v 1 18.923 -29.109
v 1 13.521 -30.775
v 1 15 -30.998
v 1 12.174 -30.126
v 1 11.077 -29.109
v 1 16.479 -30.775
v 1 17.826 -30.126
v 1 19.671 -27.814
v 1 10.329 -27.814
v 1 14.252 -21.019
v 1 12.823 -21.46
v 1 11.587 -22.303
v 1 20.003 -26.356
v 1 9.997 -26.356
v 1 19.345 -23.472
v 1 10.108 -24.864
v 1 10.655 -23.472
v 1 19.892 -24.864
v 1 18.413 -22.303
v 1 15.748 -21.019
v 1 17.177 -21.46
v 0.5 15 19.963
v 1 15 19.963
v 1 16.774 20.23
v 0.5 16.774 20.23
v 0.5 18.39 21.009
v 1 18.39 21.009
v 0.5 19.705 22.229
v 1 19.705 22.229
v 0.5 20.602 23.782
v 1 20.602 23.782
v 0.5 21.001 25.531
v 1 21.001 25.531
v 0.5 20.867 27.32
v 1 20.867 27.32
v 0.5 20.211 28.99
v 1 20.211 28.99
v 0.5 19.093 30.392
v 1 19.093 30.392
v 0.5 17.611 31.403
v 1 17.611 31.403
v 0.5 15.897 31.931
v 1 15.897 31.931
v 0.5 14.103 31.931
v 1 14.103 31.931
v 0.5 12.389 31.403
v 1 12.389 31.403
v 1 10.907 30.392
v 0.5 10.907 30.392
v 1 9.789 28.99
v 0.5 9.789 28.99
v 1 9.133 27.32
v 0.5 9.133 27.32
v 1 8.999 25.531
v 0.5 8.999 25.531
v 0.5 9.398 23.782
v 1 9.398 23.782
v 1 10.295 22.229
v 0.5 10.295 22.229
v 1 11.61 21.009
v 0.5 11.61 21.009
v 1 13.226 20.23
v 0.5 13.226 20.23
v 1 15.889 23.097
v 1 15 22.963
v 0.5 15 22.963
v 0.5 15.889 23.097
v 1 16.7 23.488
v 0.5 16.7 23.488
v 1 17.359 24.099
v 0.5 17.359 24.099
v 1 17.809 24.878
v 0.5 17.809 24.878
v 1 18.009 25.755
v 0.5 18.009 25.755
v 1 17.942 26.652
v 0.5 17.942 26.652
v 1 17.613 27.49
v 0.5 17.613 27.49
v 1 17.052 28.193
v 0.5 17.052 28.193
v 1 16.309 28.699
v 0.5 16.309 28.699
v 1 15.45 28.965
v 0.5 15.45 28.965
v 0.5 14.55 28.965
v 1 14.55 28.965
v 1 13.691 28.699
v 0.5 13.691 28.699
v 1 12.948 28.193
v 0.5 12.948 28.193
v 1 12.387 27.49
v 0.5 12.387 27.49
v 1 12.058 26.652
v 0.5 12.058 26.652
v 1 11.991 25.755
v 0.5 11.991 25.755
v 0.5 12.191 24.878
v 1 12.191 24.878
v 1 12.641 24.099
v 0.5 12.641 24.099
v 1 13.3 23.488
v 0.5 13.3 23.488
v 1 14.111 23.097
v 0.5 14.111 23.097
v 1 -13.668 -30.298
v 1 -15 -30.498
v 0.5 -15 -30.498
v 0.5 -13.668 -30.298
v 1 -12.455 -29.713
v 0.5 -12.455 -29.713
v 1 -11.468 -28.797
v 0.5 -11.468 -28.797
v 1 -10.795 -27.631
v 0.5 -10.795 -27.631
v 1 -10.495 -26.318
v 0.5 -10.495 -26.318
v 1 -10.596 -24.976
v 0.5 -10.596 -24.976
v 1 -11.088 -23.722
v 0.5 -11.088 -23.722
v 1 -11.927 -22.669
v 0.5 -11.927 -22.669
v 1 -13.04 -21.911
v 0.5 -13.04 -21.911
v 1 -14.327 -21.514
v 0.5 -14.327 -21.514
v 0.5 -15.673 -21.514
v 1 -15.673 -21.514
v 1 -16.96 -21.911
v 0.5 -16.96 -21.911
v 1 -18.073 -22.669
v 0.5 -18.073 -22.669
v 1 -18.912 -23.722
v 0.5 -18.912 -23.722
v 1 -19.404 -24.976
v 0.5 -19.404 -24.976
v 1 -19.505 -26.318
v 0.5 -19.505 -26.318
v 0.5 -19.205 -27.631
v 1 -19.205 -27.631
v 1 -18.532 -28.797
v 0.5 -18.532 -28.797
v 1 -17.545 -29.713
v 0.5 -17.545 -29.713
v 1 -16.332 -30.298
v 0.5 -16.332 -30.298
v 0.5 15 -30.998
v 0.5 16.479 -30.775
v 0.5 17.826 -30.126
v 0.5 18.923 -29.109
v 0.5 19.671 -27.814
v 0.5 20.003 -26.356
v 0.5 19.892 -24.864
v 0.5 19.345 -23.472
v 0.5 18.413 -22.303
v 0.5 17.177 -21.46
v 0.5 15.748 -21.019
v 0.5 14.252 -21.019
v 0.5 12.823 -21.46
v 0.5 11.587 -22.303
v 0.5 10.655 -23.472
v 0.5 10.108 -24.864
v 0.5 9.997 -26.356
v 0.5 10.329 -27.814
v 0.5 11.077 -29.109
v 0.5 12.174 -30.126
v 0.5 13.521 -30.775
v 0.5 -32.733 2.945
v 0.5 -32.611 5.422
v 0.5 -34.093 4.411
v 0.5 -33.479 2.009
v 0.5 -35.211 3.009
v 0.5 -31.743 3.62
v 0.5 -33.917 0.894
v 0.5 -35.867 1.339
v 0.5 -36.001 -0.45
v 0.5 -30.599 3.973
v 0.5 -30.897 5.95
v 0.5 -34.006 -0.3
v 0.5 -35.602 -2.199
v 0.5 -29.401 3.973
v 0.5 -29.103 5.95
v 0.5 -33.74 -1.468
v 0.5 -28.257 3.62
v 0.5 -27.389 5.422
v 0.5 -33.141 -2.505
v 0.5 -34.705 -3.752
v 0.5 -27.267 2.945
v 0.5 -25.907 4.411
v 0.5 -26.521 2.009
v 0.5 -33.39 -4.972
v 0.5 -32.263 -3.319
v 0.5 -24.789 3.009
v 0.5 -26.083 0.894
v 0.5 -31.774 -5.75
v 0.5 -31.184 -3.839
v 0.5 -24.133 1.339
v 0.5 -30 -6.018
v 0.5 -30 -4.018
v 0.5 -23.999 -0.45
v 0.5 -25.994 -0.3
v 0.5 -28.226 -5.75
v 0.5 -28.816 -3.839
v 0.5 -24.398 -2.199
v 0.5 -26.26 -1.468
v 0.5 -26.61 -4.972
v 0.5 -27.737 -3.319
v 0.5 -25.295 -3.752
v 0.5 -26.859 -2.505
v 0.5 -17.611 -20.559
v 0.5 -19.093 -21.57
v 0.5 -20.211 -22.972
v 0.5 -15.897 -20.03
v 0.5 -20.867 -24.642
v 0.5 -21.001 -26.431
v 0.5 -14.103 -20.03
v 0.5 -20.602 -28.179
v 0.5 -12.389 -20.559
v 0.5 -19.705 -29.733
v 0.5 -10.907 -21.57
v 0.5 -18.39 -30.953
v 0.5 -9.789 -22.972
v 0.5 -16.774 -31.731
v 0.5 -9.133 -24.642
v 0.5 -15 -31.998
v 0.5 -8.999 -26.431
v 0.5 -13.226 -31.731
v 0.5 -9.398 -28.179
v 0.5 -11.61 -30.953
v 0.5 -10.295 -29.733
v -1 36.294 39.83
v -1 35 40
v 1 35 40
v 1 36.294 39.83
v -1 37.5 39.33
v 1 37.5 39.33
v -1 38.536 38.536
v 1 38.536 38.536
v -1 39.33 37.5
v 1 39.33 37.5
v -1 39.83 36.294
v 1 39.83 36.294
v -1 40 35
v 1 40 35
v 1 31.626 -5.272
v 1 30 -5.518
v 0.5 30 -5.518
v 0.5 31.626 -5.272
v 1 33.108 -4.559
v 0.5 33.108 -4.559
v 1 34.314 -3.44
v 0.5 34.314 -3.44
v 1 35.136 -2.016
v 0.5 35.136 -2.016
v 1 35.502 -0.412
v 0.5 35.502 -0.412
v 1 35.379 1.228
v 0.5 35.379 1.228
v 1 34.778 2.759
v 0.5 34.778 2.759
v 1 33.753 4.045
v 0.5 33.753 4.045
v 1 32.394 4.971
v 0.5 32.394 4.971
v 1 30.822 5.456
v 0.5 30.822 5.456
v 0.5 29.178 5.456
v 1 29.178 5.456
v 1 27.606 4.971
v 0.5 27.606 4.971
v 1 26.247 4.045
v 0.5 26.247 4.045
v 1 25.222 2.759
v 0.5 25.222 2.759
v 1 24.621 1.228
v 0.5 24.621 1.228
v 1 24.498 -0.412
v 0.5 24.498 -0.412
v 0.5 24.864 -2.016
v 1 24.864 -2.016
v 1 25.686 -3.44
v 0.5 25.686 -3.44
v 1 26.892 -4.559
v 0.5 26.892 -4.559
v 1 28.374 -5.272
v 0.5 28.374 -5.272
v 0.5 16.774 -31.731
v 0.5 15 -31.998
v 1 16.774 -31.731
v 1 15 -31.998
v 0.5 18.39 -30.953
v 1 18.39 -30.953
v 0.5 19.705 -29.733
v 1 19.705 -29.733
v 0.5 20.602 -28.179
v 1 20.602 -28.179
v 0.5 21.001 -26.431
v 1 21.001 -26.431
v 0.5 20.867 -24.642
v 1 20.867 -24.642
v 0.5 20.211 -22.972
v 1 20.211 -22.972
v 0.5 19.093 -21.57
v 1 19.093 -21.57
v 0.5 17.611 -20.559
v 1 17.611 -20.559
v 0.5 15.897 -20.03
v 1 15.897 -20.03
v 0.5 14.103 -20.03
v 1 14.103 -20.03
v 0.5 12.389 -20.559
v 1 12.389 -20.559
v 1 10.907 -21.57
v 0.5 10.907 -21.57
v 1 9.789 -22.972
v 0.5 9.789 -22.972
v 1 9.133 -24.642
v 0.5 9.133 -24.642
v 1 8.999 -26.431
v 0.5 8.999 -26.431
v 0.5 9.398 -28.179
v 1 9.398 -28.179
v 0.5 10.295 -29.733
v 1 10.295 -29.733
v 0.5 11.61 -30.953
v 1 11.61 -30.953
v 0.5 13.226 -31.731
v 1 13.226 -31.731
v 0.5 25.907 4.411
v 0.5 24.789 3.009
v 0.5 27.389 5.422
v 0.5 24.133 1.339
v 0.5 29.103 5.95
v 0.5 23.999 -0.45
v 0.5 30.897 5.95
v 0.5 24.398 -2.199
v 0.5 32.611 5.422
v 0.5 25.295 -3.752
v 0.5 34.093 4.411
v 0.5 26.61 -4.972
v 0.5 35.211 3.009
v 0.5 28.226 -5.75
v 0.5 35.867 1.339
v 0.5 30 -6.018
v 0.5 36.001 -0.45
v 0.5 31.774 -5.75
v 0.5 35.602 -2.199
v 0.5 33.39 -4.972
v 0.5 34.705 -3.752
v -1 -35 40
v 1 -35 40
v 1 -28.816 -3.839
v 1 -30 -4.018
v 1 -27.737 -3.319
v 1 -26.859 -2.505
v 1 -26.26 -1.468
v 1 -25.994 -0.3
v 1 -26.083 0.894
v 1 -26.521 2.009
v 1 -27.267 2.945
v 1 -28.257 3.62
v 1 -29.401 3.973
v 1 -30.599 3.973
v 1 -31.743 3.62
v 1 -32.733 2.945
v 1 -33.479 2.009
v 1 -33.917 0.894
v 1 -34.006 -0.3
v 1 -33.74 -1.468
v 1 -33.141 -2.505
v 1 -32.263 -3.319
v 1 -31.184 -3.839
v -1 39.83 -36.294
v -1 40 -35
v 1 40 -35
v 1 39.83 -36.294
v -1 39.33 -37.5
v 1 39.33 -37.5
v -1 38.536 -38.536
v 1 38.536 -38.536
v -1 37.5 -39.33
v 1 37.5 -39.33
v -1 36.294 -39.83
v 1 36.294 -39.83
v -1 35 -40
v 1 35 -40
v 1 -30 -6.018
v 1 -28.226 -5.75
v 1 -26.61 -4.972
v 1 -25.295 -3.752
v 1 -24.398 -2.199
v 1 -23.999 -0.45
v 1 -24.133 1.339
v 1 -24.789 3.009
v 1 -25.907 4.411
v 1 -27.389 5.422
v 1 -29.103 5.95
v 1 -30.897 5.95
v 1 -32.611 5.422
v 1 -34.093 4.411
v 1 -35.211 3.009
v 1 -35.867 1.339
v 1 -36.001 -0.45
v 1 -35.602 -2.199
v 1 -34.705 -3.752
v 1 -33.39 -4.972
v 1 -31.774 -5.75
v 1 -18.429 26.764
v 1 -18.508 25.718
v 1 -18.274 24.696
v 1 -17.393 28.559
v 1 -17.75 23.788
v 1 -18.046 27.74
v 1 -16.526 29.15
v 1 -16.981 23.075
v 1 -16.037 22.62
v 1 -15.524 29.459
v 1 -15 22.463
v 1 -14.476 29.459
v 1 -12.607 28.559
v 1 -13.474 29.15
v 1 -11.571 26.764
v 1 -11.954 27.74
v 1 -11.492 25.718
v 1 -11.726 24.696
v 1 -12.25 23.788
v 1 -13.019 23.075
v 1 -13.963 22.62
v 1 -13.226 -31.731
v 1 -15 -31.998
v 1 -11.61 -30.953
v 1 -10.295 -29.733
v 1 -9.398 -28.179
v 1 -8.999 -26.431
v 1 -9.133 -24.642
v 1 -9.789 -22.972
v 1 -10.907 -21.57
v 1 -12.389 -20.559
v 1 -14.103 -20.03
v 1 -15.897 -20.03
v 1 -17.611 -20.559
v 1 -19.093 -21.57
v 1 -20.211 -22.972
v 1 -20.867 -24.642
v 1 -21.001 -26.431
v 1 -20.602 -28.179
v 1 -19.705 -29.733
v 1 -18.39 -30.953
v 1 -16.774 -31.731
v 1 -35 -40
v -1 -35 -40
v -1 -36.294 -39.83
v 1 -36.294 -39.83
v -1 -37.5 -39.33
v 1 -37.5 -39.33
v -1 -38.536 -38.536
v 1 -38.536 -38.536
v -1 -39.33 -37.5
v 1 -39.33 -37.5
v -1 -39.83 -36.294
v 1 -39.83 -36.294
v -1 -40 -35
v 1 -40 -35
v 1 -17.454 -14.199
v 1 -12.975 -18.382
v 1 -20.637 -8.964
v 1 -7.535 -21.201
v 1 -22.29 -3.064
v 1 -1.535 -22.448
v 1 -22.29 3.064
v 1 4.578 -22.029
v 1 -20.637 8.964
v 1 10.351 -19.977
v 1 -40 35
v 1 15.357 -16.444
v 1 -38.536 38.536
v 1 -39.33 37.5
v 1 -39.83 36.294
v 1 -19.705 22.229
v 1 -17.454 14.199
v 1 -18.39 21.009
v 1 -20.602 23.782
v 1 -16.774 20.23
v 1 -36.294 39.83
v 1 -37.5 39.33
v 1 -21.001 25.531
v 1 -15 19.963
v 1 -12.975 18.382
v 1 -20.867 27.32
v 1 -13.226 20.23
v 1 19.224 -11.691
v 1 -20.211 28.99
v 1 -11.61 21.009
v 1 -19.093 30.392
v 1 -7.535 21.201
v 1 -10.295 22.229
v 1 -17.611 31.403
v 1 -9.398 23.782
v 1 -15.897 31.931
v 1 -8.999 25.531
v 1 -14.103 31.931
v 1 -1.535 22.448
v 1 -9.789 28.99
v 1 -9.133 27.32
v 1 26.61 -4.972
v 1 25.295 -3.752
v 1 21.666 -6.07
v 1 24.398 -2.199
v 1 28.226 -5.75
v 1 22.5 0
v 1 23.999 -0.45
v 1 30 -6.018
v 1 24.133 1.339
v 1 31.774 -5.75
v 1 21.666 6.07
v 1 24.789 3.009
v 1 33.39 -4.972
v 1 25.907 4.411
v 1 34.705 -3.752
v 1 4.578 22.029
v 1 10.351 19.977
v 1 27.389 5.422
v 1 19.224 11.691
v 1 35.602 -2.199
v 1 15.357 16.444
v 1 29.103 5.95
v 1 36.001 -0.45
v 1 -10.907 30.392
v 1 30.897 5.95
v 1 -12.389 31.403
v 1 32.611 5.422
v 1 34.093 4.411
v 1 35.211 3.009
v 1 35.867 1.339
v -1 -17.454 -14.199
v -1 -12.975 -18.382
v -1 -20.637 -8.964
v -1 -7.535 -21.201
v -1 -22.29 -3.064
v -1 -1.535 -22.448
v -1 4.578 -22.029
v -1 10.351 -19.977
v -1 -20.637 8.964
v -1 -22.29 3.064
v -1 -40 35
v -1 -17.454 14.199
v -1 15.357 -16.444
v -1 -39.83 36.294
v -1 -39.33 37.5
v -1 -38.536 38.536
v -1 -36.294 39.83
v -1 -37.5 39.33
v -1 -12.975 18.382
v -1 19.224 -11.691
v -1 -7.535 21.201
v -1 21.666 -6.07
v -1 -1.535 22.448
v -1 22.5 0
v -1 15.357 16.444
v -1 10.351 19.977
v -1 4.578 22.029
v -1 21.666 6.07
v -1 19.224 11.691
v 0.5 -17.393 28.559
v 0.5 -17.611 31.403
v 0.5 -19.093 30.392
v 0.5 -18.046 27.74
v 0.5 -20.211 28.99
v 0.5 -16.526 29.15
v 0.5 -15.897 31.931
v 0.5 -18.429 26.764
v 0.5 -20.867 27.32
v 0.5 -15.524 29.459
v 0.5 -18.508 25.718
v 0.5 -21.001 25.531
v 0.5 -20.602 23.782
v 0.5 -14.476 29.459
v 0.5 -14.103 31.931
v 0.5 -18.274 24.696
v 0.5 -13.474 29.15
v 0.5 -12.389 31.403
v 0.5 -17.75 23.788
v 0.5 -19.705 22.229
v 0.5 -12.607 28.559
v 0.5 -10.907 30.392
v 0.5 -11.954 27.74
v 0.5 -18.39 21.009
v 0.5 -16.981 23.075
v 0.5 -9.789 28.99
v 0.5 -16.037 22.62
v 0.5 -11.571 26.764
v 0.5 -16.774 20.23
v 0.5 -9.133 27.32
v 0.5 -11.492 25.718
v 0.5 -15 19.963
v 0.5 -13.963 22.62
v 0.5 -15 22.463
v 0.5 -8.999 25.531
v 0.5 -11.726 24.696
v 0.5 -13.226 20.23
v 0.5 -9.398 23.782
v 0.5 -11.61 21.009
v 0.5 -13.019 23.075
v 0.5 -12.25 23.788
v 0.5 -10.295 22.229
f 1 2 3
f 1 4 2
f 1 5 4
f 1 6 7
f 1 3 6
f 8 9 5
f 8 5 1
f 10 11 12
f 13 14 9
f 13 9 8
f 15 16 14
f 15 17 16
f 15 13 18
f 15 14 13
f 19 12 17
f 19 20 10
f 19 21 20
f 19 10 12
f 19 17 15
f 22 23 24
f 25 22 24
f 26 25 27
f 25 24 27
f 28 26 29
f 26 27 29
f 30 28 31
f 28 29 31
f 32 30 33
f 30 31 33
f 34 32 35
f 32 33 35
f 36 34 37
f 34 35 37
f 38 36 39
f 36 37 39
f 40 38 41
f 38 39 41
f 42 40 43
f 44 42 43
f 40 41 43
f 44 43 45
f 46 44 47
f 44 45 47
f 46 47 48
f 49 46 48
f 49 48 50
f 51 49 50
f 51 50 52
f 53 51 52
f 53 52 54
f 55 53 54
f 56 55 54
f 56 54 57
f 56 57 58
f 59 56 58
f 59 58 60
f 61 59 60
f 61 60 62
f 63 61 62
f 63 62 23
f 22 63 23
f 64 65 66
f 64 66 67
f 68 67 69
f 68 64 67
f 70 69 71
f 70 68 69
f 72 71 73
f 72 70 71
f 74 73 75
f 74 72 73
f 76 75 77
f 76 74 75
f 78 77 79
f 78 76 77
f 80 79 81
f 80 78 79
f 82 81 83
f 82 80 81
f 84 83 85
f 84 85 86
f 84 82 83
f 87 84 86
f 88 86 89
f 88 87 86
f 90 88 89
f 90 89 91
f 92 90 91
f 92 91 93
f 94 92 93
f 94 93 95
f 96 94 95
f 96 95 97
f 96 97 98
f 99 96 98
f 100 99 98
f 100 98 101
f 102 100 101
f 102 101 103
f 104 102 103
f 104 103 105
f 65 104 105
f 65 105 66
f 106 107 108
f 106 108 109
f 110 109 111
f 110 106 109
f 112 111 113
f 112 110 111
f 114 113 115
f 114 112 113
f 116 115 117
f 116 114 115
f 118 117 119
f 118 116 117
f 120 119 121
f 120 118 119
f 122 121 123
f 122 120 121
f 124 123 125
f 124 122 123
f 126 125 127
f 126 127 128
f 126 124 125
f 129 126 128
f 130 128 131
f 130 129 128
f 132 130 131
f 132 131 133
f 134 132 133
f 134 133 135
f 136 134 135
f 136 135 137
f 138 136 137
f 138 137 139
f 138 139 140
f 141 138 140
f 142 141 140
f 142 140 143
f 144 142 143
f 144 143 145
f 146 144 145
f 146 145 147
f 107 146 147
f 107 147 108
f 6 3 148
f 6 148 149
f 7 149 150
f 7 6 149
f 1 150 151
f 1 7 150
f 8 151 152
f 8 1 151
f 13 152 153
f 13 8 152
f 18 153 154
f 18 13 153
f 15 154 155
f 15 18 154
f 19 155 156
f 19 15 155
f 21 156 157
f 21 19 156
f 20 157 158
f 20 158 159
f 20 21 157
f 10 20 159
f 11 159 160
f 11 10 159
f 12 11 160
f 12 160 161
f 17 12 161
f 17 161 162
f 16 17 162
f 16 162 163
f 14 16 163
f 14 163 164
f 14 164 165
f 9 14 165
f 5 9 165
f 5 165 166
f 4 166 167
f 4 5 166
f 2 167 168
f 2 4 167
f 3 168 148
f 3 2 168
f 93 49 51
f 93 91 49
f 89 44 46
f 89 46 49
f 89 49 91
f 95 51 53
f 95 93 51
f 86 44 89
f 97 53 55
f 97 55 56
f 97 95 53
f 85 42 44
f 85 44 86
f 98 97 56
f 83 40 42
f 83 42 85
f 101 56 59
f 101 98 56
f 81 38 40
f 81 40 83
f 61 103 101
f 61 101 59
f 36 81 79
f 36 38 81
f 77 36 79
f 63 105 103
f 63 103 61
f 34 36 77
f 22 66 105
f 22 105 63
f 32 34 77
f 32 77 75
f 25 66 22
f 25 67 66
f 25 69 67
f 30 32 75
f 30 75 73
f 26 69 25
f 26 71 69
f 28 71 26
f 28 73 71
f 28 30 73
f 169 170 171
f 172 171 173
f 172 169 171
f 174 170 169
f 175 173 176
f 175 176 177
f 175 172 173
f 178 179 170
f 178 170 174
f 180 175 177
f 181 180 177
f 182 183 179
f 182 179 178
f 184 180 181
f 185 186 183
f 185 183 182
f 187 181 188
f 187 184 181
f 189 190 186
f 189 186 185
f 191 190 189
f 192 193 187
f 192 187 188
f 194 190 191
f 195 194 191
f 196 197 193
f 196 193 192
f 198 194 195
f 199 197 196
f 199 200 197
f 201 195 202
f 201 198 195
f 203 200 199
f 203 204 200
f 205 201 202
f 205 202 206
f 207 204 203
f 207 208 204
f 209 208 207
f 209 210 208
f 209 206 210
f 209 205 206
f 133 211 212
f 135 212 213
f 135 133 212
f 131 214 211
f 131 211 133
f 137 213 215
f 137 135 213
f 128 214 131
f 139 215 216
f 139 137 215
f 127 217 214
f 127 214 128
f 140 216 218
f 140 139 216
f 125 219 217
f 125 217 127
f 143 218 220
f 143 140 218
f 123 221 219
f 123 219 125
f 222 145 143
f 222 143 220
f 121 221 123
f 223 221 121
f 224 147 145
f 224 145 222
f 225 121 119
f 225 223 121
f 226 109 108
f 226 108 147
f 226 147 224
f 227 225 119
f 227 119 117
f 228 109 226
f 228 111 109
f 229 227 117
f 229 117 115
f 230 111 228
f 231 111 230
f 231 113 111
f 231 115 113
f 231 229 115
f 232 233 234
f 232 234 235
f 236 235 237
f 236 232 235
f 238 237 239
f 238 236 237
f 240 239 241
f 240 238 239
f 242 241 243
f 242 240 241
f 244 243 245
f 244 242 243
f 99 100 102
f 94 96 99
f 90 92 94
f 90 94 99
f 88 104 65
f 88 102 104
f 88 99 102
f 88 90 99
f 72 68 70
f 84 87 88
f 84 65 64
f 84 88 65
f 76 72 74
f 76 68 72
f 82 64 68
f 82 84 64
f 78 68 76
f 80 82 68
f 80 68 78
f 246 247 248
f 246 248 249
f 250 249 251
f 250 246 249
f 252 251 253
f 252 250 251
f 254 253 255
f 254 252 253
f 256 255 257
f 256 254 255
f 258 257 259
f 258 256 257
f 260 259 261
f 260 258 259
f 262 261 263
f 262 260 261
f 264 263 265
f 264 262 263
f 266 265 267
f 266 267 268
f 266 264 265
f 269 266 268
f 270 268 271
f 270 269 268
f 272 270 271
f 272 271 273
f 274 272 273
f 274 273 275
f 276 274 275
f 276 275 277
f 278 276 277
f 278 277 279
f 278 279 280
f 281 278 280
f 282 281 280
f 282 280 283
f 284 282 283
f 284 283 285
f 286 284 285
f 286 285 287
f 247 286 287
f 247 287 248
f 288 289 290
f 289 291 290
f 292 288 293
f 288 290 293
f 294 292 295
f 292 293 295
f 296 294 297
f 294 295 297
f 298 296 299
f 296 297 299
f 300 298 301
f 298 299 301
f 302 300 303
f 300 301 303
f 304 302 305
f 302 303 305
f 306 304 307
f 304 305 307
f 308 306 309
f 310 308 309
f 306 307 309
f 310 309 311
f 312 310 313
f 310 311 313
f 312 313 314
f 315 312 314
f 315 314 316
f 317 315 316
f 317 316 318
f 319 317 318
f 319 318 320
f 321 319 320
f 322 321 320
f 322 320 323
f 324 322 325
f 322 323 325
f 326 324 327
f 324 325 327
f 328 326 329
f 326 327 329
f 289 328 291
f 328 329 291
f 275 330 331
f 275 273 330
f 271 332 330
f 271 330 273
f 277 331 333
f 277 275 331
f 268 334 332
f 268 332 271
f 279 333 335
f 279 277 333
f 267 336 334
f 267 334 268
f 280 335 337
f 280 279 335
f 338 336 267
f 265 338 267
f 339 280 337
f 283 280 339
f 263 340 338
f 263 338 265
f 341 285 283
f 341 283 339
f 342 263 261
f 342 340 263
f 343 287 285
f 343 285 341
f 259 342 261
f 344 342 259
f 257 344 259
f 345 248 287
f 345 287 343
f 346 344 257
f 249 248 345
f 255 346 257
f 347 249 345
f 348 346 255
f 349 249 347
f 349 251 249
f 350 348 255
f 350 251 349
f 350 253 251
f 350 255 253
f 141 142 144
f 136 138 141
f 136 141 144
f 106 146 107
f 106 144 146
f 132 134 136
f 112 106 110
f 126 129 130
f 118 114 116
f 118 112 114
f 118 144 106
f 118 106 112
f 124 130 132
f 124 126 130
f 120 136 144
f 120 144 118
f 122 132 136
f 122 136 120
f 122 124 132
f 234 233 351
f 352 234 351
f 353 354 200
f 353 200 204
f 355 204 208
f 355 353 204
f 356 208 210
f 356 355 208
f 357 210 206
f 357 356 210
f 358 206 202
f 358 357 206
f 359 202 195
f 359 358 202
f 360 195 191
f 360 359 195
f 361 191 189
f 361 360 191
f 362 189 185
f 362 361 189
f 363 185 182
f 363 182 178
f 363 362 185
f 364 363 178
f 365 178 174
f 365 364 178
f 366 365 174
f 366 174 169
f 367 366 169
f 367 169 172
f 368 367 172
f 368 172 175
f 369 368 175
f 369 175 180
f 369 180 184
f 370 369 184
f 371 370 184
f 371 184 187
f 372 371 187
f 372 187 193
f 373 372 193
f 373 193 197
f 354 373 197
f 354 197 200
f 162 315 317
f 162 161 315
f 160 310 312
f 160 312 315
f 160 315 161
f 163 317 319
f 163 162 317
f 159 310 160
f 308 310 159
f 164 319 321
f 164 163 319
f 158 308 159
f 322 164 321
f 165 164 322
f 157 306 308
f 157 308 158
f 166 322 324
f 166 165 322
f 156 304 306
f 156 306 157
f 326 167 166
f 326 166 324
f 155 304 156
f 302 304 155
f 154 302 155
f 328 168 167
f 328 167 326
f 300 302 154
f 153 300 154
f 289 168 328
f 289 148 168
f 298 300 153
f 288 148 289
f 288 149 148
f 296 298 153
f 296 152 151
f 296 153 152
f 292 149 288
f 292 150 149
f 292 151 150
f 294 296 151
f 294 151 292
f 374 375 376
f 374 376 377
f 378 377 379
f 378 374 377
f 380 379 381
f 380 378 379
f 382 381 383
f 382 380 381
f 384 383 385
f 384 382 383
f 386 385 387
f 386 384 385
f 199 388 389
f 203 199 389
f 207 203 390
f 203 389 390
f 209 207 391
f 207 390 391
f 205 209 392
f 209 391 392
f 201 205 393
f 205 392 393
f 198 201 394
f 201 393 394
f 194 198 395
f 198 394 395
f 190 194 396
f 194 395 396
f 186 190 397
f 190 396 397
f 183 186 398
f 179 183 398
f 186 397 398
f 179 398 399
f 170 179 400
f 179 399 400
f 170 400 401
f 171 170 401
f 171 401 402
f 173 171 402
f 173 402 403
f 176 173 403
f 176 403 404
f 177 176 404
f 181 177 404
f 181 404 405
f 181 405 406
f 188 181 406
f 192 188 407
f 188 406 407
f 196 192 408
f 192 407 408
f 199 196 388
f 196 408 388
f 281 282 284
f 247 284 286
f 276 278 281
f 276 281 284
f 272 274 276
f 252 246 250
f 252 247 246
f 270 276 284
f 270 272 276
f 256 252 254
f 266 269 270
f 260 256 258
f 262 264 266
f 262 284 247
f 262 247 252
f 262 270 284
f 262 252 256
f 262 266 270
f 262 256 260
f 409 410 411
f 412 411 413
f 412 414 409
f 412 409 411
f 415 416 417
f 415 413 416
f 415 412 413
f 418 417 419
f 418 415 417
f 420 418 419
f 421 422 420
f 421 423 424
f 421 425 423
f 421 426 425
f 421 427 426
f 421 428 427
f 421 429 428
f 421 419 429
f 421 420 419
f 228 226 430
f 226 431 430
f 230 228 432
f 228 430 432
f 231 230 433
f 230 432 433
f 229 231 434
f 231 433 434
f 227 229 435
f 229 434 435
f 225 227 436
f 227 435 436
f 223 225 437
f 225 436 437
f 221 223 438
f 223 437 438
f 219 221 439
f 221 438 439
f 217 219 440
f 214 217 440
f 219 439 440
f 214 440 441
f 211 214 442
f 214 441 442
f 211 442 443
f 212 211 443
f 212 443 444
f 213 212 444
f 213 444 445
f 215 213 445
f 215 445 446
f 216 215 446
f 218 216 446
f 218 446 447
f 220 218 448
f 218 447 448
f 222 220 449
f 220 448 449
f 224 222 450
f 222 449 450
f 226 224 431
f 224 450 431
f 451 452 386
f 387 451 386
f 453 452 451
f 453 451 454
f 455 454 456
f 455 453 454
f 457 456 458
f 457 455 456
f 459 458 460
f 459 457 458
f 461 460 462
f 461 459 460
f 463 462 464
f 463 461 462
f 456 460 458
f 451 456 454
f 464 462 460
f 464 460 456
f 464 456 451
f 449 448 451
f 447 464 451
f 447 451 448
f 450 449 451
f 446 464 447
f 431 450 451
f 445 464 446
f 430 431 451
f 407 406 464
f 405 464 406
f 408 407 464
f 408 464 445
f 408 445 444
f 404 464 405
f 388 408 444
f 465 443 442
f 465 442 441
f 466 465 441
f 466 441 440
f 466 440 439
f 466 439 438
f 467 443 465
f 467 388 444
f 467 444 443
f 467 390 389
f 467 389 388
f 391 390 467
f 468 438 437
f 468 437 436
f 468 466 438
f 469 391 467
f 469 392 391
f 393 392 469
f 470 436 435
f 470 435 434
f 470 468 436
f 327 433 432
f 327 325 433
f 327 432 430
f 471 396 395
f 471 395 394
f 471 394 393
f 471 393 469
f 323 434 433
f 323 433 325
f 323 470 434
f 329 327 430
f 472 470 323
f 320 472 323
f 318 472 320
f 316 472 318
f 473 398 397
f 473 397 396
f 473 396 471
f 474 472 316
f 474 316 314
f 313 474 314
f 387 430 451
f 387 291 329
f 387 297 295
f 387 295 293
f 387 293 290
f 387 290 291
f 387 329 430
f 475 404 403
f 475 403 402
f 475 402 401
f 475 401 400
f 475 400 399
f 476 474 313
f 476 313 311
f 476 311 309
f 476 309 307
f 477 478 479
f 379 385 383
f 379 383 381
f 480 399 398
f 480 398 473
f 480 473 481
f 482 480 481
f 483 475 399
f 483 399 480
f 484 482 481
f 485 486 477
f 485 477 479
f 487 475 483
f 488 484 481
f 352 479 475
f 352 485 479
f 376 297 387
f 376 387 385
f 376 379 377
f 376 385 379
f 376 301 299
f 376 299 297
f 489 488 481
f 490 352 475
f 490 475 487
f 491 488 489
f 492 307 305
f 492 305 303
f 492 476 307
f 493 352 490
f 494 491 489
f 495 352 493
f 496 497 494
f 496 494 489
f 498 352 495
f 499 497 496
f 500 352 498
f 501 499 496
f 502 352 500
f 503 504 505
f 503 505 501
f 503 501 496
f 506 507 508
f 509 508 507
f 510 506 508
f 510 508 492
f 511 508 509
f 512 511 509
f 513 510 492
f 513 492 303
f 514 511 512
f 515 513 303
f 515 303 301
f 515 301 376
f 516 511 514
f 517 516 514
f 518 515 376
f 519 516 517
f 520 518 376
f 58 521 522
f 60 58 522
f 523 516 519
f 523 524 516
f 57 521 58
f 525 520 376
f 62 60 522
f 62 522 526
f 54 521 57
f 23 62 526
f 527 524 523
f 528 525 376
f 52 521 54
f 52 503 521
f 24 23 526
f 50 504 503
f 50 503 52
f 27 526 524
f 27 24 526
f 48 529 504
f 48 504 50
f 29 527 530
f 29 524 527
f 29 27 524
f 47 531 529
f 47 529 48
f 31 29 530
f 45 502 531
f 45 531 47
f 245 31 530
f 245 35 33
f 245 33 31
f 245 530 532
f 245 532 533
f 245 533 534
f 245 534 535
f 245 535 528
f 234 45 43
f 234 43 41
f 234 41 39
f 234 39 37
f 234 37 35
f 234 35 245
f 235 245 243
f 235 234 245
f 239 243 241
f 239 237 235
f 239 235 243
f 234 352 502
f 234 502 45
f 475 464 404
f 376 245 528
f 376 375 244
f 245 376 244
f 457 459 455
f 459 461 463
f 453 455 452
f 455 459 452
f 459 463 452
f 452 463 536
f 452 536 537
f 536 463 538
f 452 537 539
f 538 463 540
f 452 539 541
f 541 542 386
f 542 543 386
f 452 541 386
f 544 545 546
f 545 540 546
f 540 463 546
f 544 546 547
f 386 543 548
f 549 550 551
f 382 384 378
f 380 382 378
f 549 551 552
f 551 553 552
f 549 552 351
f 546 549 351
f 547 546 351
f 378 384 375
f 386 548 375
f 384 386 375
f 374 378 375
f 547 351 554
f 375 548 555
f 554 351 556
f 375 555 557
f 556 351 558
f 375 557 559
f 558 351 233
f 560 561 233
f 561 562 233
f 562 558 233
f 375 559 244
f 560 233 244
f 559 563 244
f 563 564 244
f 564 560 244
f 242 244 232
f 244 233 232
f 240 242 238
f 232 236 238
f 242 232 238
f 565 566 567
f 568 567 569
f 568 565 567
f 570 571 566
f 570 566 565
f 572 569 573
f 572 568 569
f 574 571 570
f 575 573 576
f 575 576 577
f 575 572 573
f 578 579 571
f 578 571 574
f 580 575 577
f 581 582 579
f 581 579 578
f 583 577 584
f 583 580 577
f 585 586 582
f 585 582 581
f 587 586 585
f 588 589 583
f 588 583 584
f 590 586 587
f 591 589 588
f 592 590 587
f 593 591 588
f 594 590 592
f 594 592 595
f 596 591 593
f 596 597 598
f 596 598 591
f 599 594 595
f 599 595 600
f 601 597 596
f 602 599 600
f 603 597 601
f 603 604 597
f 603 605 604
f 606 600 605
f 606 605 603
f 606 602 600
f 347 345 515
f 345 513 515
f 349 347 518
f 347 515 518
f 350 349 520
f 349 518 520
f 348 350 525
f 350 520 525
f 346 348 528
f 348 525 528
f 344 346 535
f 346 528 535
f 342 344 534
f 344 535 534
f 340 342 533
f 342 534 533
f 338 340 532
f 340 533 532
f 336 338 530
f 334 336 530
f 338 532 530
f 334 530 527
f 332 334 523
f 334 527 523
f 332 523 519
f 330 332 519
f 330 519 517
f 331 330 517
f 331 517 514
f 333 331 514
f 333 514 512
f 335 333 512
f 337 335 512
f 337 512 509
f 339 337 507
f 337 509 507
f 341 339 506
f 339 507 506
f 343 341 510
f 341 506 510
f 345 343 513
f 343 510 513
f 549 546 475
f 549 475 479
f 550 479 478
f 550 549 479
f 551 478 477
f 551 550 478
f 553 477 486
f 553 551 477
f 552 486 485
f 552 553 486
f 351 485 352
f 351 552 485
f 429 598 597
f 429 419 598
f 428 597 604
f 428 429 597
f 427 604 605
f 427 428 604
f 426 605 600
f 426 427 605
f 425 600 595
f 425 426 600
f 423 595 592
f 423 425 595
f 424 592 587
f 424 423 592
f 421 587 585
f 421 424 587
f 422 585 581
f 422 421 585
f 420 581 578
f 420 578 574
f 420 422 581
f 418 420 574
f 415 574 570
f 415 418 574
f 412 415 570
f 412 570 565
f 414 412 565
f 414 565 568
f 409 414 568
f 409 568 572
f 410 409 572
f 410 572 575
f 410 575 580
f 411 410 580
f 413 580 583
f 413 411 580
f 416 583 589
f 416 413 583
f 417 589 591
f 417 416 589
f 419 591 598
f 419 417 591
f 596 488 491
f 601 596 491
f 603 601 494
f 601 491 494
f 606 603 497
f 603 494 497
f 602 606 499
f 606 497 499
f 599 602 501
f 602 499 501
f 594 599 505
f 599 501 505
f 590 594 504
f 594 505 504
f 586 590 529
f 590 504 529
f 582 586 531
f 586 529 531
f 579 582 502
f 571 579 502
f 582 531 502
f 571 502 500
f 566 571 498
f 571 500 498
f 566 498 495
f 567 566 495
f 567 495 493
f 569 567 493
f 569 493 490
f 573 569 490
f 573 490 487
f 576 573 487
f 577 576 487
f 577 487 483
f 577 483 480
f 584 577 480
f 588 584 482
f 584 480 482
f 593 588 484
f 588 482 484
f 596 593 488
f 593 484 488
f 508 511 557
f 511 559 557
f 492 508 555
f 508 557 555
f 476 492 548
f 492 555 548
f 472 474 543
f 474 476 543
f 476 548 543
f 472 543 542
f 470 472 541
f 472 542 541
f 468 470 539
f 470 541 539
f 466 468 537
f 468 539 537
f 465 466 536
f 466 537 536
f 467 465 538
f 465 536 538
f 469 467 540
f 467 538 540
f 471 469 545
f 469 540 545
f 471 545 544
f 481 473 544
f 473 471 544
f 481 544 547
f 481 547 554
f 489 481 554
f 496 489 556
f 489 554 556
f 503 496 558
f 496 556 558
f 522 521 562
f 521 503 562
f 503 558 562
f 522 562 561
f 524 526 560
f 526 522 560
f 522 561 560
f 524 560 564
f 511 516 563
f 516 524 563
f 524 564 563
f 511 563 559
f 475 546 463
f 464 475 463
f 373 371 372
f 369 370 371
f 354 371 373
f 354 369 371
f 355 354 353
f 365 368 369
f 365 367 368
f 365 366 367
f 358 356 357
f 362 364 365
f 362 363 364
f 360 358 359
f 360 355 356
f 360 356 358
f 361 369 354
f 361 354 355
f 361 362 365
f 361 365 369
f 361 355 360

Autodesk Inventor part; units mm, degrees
ref_plane "YZ Plane" through (0, 0, 0) normal (1, 0, 0) x (0, 1, 0)
ref_plane "XZ Plane" through (0, 0, 0) normal (0, 1, 0) x (-1, 0, 0)
ref_plane "XY Plane" through (0, 0, 0) normal (0, 0, 1) x (1, 0, 0)
sketch "Schizzo1" plane through (0, 0, 0) normal (1, 0, 0) x (0, 1, 0)
  line L0 (-35, -40) -> (35, -40)
  line L1 (40, -35) -> (40, 35)
  line L2 (35, 40) -> (-35, 40)
  line L3 (-40, 35) -> (-40, -35)
  line L4 (-40, -40) -> (40, 40) construction
  line L5 (40, -40) -> (-40, 40) construction
  arc A0 (40, 35) -> (35, 40) centre (35, 35) ccw
  arc A1 (35, -40) -> (40, -35) centre (35, -35) ccw
  arc A2 (-35, 40) -> (-40, 35) centre (-35, 35) ccw
  arc A3 (-40, -35) -> (-35, -40) centre (-35, -35) ccw
  circle A4 centre (0, 0) radius 22.5
  dimension "d4" = 45
extrude "Estrusione1" add sketch "Schizzo1" along normal mid plane 2
sketch "Schizzo2" plane through (1, 0, 0) normal (1, 0, 0) x (0, 0, -1)
  circle A0 centre (0, 0) radius 30
  circle A1 centre (0, 30) radius 6.0177
  circle A2 centre (-25.9808, 15) radius 6.0177
  circle A3 centre (-25.9808, -15) radius 6.0177
  circle A4 centre (0, -30) radius 6.0177
  circle A5 centre (25.9808, -15) radius 6.0177
  circle A6 centre (25.9808, 15) radius 6.0177
  circle A7 centre (-25.9808, 15) radius 5.5175
  circle A8 centre (-25.9808, 15) radius 5.0175
  circle A9 centre (-25.9808, 15) radius 4.5175
  circle A10 centre (-25.9808, 15) radius 4.0175
  circle A11 centre (-25.9808, 15) radius 3.5175
  circle A12 centre (0, -30) radius 6.0177
  circle A13 centre (-25.9808, -15) radius 3.5175
  circle A14 centre (-25.9808, -15) radius 4.0175
  circle A15 centre (-25.9808, -15) radius 4.5175
  circle A16 centre (-25.9808, -15) radius 5.0175
  circle A17 centre (-25.9808, -15) radius 5.5175
  circle A18 centre (25.9808, -15) radius 6.0177
  circle A19 centre (0, -30) radius 3.5175
  circle A20 centre (0, -30) radius 4.0175
  circle A21 centre (0, -30) radius 4.5175
  circle A22 centre (0, -30) radius 5.0175
  circle A23 centre (0, -30) radius 5.5175
  circle A24 centre (25.9808, 15) radius 6.0177
  circle A25 centre (25.9808, -15) radius 3.5175
  circle A26 centre (25.9808, -15) radius 4.0175
  circle A27 centre (25.9808, -15) radius 4.5175
  circle A28 centre (25.9808, -15) radius 5.0175
  circle A29 centre (25.9808, -15) radius 5.5175
  circle A30 centre (0, 30) radius 6.0177
  circle A31 centre (25.9808, 15) radius 3.5175
  circle A32 centre (25.9808, 15) radius 4.0175
  circle A33 centre (25.9808, 15) radius 4.5175
  circle A34 centre (25.9808, 15) radius 5.0175
  circle A35 centre (25.9808, 15) radius 5.5175
  circle A36 centre (-25.9808, 15) radius 6.0177
  circle A37 centre (0, 30) radius 3.5175
  circle A38 centre (0, 30) radius 4.0175
  circle A39 centre (0, 30) radius 4.5175
  circle A40 centre (0, 30) radius 5.0175
  circle A41 centre (0, 30) radius 5.5175
  circle A42 centre (-25.9808, 15) radius 3.0175
  dimension "d7" = 60
  dimension "d10" = 360
  dimension "d13" = 11.035
  dimension "d14" = 10.035
  dimension "d15" = 9.035
  dimension "d16" = 8.035
  dimension "d17" = 7.035
  dimension "d20" = 360
  dimension "d24" = 6.035
extrude "Estrusione2" cut sketch "Schizzo2" against normal blind 0.5 contours A6 A0 A35 | A0 A35 A6 | A5 A0 A29 | A0 A29 A5 | A35 A0 A34 | A0 A34 A35 | A29 A0 A28 | A0 A28 A29 | A1 A0 A41 | A0 A41 A1 | A28 A0 A27 | A0 A27 A28 | A4 A0 A23 | A0 A23 A4 | A23 A0 A22 | A0 A22 A23 | A2 A0 A7 | A0 A7 A2 | A22 A0 A21 | A0 A21 A22 | A3 A0 A17 | A0 A17 A3 | A7 A0 A8 | A0 A8 A7 | A21 A0 A20 | A0 A20 A21 | A17 A0 A16 | A0 A16 A17 | A8 A0 A9 | A0 A9 A8 | A16 A0 A15 | A0 A15 A16 | A9 A0 A10 | A0 A10 A9 | A15 A0 A14 | A0 A14 A15 | A10 A0 A11 | A0 A11 A10 | A14 A0 A13 | A0 A13 A14 | A11 A0 A42 | A0 A42 A11
